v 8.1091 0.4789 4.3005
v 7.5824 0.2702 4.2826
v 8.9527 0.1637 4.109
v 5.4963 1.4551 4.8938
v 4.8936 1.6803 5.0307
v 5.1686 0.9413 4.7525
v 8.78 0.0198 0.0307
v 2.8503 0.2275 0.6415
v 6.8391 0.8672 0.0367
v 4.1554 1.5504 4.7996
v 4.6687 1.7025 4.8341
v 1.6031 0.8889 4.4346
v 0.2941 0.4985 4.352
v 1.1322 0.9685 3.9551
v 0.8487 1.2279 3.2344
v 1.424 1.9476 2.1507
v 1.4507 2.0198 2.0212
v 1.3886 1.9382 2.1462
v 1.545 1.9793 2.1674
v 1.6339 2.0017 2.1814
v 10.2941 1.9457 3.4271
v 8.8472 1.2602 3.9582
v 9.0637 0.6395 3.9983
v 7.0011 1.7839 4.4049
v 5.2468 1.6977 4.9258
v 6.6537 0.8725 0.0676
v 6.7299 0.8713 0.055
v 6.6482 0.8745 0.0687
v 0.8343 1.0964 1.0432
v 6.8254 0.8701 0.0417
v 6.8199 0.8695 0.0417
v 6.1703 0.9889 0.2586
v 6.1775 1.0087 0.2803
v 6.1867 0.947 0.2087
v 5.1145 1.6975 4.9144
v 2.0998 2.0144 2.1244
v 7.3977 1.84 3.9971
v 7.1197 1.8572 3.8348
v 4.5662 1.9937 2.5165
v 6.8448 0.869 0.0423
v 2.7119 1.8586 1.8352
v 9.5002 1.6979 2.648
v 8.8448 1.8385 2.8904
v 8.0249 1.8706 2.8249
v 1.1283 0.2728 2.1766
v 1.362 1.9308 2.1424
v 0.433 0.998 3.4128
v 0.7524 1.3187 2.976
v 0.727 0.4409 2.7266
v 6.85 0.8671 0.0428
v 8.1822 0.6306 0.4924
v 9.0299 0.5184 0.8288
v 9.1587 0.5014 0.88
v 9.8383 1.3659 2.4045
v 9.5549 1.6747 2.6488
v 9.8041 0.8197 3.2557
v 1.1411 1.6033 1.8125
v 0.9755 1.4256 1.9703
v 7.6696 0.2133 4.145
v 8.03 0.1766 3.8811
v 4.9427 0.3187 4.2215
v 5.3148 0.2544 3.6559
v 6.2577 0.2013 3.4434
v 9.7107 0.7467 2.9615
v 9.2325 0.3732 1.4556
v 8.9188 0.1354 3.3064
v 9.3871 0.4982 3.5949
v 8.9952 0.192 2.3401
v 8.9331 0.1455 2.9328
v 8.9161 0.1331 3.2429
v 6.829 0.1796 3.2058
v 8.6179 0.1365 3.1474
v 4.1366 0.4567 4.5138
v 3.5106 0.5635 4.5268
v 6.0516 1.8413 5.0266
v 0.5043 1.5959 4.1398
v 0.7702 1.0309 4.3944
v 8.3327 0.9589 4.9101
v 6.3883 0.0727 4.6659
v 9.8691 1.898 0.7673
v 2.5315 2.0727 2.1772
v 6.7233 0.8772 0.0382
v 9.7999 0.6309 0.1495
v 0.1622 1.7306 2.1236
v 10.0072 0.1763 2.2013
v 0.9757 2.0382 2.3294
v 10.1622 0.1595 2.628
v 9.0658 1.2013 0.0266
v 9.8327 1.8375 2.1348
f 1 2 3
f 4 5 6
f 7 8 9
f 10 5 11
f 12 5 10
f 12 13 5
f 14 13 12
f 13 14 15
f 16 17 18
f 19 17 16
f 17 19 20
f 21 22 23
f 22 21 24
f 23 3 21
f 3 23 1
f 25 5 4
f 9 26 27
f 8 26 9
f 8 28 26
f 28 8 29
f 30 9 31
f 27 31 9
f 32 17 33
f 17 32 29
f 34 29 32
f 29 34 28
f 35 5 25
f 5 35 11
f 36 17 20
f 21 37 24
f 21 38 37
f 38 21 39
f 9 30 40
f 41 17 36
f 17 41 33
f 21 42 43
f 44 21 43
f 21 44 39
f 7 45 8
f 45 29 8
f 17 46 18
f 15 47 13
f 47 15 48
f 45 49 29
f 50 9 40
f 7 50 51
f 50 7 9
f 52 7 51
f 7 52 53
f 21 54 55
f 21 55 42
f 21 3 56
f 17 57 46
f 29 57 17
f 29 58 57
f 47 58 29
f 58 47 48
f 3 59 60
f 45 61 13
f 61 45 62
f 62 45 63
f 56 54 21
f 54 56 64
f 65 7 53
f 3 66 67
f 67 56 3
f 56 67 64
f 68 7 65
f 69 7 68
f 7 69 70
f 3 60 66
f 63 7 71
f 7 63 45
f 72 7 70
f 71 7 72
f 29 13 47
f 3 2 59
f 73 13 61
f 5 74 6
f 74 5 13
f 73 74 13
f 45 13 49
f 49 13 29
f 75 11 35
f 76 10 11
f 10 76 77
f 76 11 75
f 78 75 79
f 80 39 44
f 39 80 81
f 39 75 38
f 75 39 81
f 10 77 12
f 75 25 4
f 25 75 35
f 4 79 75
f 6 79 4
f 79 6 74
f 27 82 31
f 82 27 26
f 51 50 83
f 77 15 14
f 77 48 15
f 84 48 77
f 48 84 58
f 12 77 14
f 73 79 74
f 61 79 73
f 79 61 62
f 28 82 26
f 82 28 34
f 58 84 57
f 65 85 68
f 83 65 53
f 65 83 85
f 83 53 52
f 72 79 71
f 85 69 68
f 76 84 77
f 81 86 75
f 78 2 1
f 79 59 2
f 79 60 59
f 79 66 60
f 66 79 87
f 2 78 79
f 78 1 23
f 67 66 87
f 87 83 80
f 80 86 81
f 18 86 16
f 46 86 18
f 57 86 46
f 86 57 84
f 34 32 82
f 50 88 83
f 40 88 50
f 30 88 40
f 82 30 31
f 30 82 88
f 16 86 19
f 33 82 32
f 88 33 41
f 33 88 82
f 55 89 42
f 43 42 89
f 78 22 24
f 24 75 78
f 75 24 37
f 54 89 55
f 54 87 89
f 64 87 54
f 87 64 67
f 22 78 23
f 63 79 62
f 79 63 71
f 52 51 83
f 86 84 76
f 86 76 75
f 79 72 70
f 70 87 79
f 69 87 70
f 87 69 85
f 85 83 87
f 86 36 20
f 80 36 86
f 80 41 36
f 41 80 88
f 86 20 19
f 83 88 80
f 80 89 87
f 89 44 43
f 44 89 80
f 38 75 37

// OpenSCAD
m=15;
n=150;
g=2;
union(){
p=[for(i=[1 :n])[rnd(0,m),rnd(0,m),rnd(0,m)] ];
for (d=[1:g]){
resize([10,2,5])hull(){
        polyhedron(p,[for(i=[1 :m/g])[rnd(0,n),rnd(0,n),rnd(0,n)] ])
    ; }}
}
function rnd(a,b)=a+(rands(0,1,1)[0])*(b-a);     
